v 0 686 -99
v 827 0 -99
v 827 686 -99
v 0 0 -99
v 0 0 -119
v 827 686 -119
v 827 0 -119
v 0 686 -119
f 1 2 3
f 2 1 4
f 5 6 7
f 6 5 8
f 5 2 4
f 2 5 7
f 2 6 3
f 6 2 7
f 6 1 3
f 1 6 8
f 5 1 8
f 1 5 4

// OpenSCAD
// Set the width and height of the photo to build a 'platform' for the spectrogram to give it rigidity
imgwidthpixels=827;
imgheightpixels=686;
// Set how big the distance is between white and black as a scaling factor
vscalefactor=1;
// Adjust how far from zero the 'platform' is depending on the Z-height of the spectrogram (vscalefactor)
platformoffset=-119;
// Adjust the thickness of the platform
platformthickness=20;

// Combine the two pieces (spectrogram and platform)
union(){
    // Create and scale the surface. Adjust the file path below to locate your picture.
    scale([1, 1, vscalefactor]) surface(file = "/home/wstyler/Documents/cad/noise_15perc.png", invert = true);
    // Create and move the platform#
    translate([0,0,platformoffset]) cube([imgwidthpixels,imgheightpixels,platformthickness]);
}
